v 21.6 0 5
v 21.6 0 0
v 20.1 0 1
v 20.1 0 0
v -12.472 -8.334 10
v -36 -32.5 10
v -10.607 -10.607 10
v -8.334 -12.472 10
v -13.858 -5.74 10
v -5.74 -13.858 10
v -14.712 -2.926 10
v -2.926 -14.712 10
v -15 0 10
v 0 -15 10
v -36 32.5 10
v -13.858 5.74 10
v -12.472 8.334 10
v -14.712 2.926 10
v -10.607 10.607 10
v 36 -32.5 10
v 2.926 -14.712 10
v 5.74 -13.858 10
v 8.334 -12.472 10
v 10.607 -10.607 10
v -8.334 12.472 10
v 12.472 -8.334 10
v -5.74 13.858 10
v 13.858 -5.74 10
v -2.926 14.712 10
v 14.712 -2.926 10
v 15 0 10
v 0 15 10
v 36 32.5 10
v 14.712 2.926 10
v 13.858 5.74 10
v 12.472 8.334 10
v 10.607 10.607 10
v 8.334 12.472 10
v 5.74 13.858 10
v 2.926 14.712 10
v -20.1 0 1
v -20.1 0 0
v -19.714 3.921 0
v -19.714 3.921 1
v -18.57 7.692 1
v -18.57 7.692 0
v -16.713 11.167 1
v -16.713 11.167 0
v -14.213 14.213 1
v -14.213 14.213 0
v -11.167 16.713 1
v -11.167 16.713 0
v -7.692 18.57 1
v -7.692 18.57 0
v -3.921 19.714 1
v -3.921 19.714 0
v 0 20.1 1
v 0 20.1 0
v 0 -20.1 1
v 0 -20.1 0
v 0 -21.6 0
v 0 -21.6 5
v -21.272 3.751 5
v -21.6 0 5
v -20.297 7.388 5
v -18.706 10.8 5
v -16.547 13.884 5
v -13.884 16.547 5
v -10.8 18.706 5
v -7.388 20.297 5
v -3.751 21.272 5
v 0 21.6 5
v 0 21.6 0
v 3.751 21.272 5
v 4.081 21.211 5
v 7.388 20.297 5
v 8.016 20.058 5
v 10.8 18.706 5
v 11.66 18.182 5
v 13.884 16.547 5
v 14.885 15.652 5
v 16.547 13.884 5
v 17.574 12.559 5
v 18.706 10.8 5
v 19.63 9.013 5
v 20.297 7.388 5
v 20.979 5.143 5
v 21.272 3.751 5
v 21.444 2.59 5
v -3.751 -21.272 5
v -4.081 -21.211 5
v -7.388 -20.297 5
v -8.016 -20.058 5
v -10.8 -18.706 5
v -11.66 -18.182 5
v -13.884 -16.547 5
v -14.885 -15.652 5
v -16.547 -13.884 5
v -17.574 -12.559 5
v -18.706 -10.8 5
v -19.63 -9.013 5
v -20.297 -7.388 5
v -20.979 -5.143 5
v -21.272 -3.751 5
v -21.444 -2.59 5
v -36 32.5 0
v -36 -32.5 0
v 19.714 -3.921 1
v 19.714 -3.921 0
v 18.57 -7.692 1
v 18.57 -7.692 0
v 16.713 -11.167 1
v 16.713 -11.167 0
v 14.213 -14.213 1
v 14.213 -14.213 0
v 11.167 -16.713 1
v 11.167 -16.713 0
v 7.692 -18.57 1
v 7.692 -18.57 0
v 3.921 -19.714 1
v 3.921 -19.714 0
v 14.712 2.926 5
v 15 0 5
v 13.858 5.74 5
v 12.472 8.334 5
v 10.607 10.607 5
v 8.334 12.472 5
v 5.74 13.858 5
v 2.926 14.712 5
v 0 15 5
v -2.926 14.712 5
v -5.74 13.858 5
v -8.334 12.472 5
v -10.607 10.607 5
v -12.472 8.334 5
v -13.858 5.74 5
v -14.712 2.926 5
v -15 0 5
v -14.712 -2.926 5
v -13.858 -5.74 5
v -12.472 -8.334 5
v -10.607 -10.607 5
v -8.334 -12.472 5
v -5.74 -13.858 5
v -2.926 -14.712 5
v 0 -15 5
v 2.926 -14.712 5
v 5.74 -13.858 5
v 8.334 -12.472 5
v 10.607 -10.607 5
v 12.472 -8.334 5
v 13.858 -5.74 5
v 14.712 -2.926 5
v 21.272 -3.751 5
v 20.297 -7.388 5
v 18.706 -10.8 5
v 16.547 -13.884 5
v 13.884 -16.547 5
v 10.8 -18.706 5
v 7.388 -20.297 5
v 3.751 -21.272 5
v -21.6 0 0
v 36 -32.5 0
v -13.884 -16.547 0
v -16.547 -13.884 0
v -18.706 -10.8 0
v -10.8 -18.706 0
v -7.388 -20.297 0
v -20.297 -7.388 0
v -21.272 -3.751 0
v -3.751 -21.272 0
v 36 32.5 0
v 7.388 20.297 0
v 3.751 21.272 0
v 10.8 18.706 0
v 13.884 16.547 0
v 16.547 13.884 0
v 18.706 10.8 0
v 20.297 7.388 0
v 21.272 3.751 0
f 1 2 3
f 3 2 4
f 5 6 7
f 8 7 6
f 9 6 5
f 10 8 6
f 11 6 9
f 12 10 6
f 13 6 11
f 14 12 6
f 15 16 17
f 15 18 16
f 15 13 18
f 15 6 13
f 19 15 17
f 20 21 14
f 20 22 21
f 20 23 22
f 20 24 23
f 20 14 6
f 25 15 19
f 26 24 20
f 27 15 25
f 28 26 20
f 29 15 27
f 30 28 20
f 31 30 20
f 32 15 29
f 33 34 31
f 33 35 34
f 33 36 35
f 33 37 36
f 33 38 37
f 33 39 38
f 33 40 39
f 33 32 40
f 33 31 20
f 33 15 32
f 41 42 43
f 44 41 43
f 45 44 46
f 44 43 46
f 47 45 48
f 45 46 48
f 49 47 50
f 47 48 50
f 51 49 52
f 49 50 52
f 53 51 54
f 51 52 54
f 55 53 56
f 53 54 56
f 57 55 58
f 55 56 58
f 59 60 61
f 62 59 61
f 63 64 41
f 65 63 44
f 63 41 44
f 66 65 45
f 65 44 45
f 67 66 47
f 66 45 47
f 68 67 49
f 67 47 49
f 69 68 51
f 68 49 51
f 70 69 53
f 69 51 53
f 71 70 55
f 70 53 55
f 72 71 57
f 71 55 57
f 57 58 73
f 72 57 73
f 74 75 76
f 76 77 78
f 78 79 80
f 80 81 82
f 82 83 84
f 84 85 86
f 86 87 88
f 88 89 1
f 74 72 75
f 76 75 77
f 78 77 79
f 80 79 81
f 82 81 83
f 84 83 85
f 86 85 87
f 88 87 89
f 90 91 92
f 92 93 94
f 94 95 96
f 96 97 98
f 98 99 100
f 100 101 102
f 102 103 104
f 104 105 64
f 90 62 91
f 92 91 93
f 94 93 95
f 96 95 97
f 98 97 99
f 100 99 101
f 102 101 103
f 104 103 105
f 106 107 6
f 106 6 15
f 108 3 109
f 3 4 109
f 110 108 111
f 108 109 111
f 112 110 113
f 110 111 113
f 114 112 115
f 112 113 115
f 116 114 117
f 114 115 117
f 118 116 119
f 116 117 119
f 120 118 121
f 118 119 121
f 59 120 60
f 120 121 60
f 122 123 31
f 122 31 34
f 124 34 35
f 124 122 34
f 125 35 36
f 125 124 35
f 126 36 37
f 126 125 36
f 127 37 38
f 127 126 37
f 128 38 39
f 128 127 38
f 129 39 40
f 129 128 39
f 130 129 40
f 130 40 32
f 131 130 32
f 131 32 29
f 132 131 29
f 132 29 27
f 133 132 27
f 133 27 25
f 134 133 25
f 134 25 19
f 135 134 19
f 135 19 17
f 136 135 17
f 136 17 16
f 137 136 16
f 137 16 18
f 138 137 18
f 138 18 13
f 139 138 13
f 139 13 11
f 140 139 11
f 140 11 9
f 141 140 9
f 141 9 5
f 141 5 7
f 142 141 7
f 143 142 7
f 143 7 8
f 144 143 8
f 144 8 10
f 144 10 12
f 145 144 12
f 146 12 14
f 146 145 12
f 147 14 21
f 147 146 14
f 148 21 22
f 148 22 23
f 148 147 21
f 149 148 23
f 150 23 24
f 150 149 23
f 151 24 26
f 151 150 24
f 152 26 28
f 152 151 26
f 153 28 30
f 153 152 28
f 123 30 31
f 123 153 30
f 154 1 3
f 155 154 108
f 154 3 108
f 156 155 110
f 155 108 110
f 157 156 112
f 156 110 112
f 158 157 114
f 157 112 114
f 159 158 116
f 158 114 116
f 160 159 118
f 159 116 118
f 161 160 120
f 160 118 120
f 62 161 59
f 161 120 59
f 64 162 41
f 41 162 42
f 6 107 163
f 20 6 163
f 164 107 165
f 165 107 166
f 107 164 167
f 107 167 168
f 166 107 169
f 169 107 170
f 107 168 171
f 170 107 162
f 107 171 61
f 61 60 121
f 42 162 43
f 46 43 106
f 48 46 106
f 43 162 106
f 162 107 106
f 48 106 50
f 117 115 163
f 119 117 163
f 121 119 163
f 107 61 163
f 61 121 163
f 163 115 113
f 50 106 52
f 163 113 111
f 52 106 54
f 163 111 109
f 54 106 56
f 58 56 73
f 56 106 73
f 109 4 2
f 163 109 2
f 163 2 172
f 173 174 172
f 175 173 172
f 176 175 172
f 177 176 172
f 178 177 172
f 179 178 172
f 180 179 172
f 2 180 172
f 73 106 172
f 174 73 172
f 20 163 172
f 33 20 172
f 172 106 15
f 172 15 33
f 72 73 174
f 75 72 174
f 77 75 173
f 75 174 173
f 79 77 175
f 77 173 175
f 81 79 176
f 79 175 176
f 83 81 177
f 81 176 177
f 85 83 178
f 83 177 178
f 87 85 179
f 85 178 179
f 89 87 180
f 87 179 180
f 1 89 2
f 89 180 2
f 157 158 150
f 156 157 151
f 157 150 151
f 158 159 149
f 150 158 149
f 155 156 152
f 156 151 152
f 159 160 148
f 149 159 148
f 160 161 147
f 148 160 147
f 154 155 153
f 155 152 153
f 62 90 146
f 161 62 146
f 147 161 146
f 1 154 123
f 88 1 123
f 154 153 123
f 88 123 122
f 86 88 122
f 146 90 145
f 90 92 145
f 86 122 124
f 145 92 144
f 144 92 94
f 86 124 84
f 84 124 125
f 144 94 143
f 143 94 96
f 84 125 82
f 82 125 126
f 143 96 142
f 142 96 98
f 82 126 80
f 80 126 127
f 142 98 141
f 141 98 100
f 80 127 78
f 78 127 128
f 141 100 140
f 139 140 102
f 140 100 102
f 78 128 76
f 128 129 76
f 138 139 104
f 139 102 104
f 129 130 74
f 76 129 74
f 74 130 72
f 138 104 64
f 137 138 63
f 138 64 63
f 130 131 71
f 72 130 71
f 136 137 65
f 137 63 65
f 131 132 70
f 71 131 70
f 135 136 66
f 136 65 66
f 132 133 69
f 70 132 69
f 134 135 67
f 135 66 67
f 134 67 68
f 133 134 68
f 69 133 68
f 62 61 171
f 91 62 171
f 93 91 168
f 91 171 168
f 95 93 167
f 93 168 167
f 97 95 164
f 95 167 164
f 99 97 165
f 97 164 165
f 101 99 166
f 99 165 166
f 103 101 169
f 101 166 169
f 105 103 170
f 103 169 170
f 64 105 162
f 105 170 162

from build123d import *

# Parameters (mm, degrees)
F0_W     = 72
F0_H     = 65
F0_R     = 15
F1_DEPTH = 10
F5_DEPTH = 5


with BuildPart() as f1:
    # F0 (on Top) → F1 (new body)
    with BuildSketch(Plane.XY):
        Rectangle(F0_W, F0_H)
        Circle(F0_R, mode=Mode.SUBTRACT)
    extrude(amount=F1_DEPTH)

    # F2 (on Right) → F3 (revolve, cut)
    with BuildSketch(Plane.YZ):
        Polygon((-20.1, 0), (0, 0), (0, 5), (-21.6, 5), (-20.1, 1), align=None)
    revolve(axis=Axis((0, 0, 2.5), (0, 0, -1)), mode=Mode.SUBTRACT)

    # F4 (on face) → F5 (cut)
    with BuildSketch(Plane(origin=(0, 0, 0), x_dir=(1, 0, 0), z_dir=(0, 0, -1))):
        with BuildLine():
            ThreePointArc((0, 21.6), (-15.273506, 15.273506), (-21.6, 0))
            Line((-21.6, 0), (-20.1, 0))
            ThreePointArc((-20.1, 0), (-14.212846, 14.212846), (0, 20.1))
            Line((0, 20.1), (0, 21.6))
        make_face()
        with BuildLine():
            Line((0, -20.1), (0, -21.6))
            ThreePointArc((0, -21.6), (15.273506, -15.273506), (21.6, 0))
            Line((21.6, 0), (20.1, 0))
            ThreePointArc((20.1, 0), (14.212846, -14.212846), (0, -20.1))
        make_face()
    extrude(amount=-F5_DEPTH, mode=Mode.SUBTRACT)


solid = f1.part
